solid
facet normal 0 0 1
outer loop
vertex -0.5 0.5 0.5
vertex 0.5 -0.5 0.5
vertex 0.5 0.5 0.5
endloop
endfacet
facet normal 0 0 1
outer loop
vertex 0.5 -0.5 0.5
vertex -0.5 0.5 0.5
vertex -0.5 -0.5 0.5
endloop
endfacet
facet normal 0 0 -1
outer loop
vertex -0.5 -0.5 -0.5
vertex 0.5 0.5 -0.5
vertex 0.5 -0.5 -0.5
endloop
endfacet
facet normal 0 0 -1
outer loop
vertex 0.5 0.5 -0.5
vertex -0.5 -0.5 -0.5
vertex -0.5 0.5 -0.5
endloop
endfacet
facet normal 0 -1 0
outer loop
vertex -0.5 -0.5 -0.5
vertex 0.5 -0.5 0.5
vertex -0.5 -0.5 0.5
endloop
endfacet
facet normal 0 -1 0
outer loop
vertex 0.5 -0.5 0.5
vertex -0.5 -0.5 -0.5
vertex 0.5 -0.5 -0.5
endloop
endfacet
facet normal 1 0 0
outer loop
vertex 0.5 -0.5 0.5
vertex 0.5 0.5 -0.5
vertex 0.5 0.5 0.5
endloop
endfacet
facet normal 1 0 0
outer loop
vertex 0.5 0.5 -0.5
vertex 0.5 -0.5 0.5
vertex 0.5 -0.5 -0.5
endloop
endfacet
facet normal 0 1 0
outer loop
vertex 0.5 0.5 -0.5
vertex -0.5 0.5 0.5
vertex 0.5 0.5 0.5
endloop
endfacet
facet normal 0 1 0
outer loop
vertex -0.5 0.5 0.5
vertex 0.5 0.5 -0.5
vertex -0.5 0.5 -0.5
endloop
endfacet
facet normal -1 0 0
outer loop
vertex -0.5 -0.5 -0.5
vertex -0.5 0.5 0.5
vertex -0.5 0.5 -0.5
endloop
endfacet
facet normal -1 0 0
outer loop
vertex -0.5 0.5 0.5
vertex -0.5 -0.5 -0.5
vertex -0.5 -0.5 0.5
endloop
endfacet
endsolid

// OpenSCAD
	
	cube(1,1,1,center=true);
	//translate([4,0,0])
	//    cube(2,1,0.1,center=true);
	//translate([2,3,0])
	//    cube(1,0.1,10.0,center=true);
	//difference() {
	//    cube(3.2,3.2,3.2,center=true);
	//    sphere(r=2.1,$fn=40);
	//}
